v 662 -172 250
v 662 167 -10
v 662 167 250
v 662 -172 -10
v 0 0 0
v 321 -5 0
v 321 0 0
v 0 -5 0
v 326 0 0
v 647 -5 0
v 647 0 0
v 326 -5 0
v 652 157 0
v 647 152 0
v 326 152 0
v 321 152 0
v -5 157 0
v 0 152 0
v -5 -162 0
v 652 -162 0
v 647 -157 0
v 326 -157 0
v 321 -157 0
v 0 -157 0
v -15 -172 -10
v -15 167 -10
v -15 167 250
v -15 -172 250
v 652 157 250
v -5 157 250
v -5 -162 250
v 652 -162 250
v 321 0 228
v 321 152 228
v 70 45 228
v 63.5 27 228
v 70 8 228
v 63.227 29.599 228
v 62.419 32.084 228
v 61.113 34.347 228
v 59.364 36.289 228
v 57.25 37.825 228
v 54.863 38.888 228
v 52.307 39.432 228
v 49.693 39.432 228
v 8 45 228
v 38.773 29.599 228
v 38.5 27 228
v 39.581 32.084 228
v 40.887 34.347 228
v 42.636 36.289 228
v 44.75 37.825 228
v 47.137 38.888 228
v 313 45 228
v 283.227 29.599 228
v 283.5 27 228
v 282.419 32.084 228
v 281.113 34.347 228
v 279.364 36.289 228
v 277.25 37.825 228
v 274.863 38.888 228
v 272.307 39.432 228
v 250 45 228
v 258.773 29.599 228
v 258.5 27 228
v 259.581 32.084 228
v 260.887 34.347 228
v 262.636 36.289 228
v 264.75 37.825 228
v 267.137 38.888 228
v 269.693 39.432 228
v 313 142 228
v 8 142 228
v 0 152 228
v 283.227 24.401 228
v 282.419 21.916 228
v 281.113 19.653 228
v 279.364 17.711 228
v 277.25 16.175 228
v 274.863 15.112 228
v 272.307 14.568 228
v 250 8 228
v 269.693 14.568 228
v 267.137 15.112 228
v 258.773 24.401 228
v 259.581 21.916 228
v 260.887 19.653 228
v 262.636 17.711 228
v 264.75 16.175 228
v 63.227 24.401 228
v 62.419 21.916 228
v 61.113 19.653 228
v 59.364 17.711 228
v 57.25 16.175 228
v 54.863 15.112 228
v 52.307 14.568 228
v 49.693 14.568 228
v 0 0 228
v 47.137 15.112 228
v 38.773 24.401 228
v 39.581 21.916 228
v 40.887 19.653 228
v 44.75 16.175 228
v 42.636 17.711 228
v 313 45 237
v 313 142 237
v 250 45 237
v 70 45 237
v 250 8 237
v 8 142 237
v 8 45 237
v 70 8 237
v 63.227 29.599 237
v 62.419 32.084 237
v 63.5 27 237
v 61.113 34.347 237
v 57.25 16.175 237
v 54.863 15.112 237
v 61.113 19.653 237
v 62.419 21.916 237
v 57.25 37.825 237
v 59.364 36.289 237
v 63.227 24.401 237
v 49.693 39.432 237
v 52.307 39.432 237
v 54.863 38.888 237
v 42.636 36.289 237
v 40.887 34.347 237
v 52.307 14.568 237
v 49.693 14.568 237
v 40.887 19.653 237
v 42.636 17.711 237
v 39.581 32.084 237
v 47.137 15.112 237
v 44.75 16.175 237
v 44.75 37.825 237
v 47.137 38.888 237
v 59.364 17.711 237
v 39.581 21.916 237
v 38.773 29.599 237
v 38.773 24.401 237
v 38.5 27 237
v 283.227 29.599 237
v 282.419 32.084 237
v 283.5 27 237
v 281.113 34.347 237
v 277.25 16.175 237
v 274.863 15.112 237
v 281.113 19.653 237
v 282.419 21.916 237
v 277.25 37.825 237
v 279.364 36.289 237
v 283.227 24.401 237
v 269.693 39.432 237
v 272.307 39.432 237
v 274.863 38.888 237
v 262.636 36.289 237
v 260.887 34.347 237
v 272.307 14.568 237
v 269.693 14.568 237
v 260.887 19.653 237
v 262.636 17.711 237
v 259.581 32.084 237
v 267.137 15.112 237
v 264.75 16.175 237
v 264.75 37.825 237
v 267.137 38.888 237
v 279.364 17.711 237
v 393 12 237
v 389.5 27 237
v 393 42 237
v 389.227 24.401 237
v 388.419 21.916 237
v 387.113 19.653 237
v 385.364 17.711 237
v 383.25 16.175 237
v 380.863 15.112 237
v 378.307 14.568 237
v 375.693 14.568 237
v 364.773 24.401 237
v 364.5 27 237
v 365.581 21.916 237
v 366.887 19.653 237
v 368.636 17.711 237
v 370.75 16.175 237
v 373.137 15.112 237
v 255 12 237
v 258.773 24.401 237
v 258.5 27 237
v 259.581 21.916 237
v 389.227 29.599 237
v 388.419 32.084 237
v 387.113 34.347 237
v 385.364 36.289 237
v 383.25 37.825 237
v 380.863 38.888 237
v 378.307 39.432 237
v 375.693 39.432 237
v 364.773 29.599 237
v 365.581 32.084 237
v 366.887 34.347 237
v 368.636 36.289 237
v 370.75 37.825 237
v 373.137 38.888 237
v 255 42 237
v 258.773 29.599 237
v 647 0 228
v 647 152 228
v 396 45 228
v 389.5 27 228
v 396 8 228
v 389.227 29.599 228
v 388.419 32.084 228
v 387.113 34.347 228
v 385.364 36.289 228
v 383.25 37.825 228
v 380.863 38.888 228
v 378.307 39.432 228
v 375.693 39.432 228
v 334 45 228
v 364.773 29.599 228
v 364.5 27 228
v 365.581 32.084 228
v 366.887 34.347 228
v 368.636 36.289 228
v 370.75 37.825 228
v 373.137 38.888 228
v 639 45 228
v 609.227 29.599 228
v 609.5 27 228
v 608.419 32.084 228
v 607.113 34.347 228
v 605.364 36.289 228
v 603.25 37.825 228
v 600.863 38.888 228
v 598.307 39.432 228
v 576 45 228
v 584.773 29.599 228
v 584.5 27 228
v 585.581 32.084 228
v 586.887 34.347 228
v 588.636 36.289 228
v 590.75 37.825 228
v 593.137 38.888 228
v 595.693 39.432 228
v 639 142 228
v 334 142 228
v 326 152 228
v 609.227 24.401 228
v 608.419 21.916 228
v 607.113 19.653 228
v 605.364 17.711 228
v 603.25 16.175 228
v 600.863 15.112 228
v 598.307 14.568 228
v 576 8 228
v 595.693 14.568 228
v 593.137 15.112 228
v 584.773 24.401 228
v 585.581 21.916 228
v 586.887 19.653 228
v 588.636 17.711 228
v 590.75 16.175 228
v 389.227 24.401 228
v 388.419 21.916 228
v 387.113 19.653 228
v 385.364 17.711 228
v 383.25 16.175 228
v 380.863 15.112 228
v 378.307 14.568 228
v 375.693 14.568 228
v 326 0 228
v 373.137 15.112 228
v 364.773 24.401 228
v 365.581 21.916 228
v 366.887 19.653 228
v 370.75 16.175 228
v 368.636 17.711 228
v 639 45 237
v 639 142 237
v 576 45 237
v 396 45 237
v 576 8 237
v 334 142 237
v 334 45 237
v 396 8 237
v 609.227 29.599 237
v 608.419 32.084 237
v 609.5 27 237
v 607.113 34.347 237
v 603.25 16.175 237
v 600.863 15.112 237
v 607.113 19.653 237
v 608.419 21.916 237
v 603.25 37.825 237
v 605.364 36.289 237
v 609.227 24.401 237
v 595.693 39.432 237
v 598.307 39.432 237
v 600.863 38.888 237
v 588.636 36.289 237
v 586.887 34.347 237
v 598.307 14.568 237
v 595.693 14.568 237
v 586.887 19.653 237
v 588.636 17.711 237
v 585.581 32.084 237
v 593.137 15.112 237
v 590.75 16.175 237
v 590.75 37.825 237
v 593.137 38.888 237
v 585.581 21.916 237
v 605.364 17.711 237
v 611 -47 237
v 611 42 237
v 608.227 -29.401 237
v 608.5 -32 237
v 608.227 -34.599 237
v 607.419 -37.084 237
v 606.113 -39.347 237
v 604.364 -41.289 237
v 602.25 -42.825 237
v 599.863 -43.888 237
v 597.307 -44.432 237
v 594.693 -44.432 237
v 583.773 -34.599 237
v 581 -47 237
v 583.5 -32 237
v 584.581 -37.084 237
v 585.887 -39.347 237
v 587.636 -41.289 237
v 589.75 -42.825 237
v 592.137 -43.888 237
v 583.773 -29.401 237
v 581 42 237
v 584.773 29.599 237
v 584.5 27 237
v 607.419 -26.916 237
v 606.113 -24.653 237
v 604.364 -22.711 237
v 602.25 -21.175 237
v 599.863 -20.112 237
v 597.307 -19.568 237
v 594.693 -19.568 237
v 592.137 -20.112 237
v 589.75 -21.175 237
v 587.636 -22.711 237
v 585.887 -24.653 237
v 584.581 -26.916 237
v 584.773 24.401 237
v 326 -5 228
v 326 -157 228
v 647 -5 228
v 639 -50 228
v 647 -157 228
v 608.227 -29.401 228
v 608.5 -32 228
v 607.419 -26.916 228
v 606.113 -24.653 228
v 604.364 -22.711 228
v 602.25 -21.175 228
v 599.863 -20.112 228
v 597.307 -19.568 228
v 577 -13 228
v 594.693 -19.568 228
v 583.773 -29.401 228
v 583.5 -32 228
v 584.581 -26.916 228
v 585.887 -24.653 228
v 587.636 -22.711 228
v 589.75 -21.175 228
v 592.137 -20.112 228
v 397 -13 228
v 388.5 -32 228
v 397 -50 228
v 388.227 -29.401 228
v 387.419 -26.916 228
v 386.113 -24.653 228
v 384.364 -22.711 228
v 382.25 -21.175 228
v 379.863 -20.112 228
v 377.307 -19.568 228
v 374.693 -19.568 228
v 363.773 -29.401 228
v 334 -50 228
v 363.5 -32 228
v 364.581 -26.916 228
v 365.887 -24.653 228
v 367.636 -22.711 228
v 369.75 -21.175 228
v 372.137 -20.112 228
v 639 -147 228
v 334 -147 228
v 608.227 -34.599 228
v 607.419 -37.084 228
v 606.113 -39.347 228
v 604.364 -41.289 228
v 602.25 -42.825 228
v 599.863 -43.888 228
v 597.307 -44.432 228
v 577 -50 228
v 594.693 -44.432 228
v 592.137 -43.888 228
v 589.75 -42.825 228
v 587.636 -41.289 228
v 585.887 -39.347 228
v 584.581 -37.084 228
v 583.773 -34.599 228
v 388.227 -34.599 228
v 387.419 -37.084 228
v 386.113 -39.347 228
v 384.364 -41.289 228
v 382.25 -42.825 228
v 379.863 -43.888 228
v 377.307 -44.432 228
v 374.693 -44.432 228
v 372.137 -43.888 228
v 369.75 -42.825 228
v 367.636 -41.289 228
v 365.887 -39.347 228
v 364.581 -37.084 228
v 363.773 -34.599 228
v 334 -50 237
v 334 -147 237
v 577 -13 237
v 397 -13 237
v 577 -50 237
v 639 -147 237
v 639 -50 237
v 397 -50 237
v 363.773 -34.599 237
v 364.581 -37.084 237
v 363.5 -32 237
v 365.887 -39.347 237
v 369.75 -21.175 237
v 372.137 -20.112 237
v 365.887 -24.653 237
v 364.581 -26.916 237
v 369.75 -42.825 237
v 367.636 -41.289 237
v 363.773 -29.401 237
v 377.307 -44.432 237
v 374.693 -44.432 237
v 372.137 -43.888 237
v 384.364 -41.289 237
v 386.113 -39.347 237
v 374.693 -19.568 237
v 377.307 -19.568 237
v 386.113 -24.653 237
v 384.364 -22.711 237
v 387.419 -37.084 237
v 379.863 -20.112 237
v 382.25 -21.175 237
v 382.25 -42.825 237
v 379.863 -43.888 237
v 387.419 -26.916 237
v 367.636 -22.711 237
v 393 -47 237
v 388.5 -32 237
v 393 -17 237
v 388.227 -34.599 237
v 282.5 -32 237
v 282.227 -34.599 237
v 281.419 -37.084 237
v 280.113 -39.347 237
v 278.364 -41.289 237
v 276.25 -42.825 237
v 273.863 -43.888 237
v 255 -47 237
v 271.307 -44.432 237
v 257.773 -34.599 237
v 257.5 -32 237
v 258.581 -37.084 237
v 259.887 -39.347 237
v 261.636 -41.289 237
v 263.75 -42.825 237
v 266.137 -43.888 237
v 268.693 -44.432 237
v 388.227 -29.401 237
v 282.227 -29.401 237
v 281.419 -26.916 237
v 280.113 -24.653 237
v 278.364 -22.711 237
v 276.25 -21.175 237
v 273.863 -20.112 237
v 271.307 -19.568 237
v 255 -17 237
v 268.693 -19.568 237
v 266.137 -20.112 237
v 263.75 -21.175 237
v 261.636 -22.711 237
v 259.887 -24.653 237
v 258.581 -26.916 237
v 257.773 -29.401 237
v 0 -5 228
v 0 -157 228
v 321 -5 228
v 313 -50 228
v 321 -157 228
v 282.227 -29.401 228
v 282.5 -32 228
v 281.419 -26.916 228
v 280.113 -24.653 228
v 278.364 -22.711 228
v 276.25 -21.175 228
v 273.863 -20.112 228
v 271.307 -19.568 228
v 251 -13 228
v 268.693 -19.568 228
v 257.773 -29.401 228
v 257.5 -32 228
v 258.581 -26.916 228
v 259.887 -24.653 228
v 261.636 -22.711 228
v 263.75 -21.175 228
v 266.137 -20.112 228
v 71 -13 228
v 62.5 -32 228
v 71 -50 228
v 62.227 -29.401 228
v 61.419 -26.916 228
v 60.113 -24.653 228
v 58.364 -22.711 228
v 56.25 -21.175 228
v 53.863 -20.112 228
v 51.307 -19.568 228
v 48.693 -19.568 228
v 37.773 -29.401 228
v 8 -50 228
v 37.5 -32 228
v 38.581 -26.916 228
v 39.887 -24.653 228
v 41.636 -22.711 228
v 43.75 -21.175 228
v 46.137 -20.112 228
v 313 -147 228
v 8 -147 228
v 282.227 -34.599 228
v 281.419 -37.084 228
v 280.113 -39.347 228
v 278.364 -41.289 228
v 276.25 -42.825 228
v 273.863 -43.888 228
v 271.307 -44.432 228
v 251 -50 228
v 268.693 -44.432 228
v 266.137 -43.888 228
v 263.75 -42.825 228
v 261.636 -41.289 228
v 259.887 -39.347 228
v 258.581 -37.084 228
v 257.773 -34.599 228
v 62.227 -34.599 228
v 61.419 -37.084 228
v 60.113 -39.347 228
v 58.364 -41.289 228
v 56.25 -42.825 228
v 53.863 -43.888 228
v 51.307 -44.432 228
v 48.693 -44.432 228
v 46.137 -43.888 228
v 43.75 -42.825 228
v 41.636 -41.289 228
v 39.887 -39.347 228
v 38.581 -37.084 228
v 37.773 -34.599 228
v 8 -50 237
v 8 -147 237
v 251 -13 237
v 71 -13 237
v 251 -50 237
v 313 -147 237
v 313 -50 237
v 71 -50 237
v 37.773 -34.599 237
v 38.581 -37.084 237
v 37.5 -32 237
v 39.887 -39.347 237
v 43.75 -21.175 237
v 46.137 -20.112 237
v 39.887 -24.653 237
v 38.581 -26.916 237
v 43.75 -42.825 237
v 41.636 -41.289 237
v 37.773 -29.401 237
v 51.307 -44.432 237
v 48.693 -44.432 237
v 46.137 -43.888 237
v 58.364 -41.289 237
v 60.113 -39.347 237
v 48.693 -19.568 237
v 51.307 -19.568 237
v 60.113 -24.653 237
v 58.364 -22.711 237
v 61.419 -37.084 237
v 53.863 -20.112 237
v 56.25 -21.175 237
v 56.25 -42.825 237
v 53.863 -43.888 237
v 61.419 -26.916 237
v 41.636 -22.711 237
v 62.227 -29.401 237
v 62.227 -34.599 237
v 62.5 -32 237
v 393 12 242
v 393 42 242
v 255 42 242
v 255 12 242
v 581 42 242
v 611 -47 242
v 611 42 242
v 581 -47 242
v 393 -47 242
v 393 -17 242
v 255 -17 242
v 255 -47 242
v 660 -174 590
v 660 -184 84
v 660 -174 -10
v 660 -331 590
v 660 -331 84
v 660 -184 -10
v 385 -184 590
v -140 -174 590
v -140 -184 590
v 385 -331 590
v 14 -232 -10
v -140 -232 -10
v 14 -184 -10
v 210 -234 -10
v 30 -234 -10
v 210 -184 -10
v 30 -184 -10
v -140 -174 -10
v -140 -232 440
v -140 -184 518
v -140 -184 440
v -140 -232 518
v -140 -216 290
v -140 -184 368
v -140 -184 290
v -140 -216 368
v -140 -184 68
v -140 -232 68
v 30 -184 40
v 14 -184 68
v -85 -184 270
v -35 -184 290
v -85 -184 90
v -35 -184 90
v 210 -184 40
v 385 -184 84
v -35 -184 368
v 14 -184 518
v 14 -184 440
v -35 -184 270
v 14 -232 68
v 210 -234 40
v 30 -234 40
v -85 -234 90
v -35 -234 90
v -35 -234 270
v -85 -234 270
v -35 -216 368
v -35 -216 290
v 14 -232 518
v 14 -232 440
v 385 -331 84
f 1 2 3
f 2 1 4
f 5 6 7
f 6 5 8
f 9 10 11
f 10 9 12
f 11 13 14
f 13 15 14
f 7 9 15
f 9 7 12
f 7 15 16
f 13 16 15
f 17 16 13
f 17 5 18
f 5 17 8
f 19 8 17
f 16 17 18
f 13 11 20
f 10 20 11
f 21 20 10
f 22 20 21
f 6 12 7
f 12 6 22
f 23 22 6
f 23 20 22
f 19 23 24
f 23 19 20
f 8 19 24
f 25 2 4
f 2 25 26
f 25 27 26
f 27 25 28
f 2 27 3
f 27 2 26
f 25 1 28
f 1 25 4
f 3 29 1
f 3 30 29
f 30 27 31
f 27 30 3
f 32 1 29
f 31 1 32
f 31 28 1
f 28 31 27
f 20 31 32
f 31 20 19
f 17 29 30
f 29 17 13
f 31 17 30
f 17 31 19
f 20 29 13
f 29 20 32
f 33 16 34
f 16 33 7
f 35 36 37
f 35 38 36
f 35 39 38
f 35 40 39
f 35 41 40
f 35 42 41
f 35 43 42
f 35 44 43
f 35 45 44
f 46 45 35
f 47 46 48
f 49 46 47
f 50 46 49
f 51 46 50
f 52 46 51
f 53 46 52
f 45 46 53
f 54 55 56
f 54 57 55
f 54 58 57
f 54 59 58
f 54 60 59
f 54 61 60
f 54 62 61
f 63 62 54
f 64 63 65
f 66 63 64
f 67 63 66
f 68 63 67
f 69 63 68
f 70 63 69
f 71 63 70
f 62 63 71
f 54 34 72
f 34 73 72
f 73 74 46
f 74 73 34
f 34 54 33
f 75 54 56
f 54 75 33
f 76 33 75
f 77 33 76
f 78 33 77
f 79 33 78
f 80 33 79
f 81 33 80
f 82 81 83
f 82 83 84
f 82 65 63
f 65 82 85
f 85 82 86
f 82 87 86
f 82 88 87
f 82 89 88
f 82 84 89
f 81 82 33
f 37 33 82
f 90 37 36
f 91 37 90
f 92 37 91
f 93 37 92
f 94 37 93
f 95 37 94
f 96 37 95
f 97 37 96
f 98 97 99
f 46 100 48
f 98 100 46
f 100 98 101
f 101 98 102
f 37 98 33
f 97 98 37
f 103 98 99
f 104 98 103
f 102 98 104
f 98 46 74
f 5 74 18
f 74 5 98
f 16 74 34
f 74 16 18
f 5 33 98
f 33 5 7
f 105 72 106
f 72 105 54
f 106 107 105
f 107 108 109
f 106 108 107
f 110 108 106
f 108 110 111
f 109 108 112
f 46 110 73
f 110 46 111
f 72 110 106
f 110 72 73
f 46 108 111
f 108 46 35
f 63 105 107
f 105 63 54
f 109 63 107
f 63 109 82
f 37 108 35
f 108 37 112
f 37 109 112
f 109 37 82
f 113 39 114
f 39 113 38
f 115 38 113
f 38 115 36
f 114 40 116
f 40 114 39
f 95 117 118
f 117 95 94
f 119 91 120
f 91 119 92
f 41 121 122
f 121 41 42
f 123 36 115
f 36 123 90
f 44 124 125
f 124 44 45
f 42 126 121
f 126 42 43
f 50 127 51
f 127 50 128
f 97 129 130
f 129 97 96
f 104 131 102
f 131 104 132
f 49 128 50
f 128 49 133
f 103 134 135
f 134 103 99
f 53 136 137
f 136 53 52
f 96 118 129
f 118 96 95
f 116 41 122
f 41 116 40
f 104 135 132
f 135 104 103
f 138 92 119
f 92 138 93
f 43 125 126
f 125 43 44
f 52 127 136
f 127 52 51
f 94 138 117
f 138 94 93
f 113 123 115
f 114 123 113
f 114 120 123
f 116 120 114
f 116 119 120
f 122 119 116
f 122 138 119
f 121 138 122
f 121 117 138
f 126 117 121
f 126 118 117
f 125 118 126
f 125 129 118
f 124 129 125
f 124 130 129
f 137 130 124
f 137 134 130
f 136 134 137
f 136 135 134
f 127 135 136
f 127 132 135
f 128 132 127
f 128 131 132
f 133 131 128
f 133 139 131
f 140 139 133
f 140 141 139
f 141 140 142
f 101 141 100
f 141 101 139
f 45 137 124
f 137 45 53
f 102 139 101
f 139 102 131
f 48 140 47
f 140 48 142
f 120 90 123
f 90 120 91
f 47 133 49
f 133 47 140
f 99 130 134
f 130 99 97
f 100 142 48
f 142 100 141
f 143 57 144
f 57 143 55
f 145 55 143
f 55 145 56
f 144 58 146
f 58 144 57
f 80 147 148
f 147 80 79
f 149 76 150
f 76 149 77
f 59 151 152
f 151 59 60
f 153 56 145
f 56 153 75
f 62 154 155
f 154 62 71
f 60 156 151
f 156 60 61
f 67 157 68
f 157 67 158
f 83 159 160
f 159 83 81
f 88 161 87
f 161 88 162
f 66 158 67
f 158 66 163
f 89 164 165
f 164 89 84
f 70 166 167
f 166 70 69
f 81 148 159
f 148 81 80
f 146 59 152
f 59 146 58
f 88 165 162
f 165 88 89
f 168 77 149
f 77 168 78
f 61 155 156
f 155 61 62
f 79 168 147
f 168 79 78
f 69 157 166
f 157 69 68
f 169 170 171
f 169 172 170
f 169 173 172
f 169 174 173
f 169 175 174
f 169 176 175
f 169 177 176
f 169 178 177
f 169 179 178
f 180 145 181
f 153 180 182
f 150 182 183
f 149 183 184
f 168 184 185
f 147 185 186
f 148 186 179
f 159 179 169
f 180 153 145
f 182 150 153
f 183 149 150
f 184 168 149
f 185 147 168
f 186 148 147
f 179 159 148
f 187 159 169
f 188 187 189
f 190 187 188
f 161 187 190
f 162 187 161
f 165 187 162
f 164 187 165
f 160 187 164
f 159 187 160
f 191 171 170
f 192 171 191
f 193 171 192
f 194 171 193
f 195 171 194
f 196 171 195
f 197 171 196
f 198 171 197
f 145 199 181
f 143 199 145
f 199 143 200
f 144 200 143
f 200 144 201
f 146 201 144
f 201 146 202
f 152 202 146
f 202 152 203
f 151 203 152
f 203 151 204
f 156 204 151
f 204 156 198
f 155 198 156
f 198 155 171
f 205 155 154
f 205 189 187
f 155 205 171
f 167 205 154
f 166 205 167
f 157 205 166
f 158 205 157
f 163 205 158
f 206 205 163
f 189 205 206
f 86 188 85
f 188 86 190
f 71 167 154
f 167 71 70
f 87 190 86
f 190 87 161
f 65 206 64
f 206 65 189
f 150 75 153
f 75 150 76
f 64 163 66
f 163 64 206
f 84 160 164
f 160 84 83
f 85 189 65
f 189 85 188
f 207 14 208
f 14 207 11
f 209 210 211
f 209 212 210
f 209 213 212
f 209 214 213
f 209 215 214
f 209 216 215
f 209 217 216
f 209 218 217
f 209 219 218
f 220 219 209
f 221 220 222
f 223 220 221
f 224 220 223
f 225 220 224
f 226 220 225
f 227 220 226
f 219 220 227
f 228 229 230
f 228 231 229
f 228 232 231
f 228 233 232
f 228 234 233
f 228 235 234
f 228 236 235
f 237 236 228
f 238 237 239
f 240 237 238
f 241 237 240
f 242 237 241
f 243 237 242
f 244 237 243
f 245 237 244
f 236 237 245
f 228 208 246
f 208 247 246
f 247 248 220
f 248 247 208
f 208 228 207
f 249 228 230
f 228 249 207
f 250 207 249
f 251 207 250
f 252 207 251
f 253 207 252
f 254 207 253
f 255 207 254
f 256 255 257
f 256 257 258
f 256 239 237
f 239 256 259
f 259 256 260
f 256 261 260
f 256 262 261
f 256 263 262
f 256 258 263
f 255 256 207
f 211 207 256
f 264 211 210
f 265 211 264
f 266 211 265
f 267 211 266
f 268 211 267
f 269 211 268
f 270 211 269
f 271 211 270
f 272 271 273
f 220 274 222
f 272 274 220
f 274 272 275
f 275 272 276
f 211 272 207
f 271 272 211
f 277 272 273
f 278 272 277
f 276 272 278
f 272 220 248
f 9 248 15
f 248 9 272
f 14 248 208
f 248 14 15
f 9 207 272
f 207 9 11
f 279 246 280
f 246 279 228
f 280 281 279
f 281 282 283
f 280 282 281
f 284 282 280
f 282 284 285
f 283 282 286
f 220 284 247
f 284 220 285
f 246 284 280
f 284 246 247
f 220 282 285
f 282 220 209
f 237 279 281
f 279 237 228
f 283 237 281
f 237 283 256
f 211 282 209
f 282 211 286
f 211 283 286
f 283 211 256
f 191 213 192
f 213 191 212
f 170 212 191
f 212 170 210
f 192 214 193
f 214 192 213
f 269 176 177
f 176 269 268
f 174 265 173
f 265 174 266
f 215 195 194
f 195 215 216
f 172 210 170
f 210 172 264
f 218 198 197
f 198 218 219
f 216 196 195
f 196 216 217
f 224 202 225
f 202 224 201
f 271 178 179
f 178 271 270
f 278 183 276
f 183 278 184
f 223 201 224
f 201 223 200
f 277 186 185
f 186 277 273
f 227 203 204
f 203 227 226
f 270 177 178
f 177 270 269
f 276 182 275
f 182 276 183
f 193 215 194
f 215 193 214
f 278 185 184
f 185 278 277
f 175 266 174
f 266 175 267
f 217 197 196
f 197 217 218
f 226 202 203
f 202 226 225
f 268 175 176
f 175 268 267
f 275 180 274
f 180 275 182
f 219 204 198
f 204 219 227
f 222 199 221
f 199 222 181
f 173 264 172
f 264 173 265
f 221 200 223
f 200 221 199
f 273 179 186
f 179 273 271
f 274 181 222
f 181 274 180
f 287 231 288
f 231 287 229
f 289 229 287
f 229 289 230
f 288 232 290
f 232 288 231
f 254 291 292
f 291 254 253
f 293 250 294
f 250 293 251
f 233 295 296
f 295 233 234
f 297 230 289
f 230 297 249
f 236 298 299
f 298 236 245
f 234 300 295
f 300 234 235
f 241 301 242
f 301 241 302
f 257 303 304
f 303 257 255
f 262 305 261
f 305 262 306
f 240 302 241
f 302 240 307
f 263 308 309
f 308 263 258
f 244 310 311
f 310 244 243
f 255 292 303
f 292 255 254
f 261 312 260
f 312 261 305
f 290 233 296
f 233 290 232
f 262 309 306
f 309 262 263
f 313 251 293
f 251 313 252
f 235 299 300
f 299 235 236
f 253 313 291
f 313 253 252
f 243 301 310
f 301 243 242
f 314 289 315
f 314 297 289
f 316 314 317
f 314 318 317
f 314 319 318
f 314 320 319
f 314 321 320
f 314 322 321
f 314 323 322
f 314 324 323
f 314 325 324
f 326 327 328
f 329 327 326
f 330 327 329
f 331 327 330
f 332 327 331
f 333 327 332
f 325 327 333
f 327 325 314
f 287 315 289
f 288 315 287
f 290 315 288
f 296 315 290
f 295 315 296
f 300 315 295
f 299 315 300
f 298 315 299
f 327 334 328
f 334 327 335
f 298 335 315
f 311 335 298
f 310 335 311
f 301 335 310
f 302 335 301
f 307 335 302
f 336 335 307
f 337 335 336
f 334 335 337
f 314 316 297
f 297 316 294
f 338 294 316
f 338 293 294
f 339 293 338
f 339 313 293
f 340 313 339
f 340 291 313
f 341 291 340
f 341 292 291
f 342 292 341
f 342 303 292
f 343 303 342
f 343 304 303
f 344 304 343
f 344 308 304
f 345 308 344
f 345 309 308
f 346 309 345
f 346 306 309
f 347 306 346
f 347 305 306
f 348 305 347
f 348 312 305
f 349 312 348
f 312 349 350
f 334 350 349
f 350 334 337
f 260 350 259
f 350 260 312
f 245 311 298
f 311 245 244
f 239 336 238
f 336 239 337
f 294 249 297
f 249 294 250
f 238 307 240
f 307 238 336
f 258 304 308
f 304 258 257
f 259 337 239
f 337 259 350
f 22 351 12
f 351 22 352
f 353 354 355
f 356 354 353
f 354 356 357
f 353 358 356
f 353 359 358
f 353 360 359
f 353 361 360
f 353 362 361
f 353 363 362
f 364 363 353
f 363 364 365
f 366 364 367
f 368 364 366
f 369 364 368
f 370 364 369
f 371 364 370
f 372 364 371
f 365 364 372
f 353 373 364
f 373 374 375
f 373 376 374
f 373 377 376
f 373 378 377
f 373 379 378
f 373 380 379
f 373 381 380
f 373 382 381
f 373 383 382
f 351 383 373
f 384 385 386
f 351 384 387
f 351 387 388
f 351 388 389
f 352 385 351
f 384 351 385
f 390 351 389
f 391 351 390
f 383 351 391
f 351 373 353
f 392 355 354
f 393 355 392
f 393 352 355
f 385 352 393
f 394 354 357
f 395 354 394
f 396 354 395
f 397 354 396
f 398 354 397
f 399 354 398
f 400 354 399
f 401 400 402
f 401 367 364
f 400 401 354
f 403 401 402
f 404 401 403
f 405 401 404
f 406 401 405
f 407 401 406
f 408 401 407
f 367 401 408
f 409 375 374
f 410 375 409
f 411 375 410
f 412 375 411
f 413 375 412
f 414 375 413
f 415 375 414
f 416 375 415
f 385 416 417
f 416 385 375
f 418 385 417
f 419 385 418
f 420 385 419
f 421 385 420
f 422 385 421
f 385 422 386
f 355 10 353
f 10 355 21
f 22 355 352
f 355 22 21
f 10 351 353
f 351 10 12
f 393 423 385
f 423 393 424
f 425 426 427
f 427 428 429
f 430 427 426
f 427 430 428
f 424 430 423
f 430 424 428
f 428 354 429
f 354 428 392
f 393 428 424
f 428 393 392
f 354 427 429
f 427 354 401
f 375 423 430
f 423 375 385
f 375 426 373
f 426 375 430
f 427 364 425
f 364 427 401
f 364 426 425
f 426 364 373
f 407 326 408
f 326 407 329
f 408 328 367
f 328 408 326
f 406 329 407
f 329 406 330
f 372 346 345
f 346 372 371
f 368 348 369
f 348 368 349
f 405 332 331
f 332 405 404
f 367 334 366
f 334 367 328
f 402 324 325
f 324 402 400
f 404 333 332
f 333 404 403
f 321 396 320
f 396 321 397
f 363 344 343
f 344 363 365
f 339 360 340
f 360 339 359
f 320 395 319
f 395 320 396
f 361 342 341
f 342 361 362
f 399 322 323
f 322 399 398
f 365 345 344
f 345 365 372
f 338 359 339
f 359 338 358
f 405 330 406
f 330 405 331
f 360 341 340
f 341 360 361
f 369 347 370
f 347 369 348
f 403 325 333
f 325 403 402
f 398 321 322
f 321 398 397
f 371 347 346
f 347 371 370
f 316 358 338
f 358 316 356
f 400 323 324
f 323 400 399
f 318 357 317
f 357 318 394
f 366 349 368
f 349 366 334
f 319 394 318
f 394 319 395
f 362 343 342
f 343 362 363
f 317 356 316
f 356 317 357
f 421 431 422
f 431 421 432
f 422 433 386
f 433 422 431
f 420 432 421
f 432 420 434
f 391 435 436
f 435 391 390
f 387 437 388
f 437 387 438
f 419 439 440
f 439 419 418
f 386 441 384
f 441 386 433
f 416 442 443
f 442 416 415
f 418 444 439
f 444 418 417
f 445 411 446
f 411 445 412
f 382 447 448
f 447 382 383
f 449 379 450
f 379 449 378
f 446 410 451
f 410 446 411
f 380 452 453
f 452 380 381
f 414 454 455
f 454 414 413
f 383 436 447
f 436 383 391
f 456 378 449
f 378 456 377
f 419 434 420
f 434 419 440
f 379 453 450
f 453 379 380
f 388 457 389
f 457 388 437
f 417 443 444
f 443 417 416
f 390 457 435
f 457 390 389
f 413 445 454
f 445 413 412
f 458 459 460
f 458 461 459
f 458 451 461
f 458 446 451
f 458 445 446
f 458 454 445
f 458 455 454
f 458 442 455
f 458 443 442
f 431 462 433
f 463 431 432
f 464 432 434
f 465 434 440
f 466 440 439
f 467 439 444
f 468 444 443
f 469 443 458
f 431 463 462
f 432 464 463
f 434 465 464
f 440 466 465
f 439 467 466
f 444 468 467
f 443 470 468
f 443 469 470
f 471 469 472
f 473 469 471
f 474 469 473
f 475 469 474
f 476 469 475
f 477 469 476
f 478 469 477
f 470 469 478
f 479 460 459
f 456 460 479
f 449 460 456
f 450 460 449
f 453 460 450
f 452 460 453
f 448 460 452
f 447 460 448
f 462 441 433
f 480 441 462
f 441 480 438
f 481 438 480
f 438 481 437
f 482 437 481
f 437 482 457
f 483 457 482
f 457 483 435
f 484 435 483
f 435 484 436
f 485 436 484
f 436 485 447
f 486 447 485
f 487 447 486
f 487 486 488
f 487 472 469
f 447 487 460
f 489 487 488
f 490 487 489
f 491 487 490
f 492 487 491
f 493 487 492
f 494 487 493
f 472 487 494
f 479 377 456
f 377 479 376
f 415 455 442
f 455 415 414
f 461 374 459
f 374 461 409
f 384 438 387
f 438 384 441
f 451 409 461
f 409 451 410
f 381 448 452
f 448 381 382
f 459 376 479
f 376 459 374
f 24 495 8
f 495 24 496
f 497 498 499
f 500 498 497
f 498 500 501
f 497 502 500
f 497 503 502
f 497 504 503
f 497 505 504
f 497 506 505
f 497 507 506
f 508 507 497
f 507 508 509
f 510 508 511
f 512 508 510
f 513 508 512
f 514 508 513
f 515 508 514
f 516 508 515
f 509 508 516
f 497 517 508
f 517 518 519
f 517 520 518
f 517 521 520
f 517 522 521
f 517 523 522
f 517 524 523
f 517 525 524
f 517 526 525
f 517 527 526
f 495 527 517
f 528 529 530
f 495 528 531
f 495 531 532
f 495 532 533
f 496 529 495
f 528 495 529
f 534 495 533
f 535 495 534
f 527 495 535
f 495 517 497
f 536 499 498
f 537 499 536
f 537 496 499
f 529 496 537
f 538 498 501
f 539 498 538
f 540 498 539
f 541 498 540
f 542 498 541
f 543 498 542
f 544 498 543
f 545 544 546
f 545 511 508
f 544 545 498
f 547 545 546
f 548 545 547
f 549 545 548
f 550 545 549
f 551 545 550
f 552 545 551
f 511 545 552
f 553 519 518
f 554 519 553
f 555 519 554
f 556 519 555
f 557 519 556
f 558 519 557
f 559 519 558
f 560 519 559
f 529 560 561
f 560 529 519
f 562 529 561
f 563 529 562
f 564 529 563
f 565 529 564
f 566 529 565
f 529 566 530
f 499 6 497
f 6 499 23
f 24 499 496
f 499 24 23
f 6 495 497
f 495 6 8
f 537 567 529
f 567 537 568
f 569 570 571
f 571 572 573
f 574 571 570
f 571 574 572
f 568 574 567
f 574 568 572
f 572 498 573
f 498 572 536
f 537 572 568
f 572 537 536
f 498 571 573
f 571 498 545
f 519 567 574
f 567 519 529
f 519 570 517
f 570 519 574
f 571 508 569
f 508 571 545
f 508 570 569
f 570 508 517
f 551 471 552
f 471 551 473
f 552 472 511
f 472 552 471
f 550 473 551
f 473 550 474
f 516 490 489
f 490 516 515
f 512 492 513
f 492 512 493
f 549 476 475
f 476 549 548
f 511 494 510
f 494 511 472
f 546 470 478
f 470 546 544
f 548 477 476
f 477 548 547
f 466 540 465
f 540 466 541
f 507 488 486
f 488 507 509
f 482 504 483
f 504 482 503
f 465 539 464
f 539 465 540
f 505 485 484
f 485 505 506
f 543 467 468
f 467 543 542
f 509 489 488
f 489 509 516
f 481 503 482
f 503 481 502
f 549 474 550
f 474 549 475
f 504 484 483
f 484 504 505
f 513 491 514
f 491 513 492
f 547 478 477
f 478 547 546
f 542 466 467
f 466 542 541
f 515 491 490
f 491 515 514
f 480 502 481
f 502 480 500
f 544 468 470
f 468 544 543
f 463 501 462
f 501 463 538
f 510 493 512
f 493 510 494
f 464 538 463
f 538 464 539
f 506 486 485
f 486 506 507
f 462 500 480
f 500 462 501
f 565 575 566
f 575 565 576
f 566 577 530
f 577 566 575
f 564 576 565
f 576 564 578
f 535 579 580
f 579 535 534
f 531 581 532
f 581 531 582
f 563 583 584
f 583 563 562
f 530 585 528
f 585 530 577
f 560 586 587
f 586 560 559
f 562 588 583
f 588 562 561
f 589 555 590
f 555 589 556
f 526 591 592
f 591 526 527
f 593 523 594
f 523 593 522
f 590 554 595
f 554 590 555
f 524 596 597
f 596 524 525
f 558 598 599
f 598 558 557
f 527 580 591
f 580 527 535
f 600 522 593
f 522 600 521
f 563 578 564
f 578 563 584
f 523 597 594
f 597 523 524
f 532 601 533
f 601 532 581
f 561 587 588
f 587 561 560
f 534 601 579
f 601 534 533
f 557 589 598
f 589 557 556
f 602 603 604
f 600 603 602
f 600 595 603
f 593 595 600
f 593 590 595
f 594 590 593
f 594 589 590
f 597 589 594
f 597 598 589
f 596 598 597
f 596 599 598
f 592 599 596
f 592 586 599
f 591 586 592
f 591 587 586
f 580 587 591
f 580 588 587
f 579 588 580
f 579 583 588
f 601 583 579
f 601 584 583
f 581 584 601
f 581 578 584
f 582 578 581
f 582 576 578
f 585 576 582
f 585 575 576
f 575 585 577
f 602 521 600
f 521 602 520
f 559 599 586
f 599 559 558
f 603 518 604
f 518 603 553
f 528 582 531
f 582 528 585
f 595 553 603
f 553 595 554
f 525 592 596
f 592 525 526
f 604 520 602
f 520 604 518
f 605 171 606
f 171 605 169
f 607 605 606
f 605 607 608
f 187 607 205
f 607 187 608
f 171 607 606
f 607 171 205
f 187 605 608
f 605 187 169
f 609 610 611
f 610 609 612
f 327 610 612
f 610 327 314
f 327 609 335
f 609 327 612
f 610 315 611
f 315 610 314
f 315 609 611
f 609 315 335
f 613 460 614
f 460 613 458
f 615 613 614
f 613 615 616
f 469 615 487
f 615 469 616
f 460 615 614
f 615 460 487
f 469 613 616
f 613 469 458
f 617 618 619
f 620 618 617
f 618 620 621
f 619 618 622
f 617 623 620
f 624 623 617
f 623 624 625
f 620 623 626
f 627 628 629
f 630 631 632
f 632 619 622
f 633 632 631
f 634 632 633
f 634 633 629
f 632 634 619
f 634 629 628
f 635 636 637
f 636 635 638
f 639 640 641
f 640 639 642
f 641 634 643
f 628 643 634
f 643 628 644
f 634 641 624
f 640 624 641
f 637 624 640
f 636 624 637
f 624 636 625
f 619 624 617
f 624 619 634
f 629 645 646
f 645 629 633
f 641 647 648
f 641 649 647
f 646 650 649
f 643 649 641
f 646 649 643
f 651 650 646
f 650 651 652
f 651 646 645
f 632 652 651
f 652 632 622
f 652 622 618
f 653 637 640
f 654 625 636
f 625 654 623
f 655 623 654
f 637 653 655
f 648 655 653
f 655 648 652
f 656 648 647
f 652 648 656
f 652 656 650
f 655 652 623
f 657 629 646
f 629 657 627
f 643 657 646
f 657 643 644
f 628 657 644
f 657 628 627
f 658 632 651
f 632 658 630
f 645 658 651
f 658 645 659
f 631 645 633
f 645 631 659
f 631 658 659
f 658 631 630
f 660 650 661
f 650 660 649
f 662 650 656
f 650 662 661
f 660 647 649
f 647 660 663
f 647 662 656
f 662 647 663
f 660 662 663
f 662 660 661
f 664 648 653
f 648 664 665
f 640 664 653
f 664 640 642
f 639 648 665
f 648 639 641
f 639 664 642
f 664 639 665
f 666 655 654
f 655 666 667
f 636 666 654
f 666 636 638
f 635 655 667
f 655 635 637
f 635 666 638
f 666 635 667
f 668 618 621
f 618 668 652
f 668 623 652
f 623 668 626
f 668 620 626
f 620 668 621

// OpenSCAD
module victron_smart_battery_200Ah()
{
    color("lightblue")
        cube([321,152,228]);
    translate([8,45,228])
        color("lightblue")
            cube([305,97,9]);
    translate([70,8,228])
        color("lightblue")
            cube([180,37,9]);
    translate([51,27,228])
        color("red")
            cylinder(9, d=25);
    translate([271,27,228])
        color("black")
            cylinder(9, d=25);
}

module victron_multiplus2_48_3000()
{
    color("lightblue")
        cube([275,147,506]);
}

module victron_smart_batteryprotect_48_100()
{
    color("lightblue")
        cube([123,120,62]);
}

module victron_smart_shunt_500A()
{
    color("lightblue")
       cube([154,48,78]);   
}

module victron_cerbo_gx()
{
    color("lightblue")
       cube([154,48,78]);   
}

module victron_vebus_bms()
{
    color("black")
        cube([105,32,78]);
}

module bluesea_powerbar_600A()
{
    color("silver")
        cube([180,50,50]);
}

module connector_short()
{
    color("silver")
        cube([89,30,5]);
}
module connector_long()
{
    color("silver")
        cube([138,30,5]);
}

module string_48VDC()
{
    victron_smart_battery_200Ah();
    translate([326,0,0])
        victron_smart_battery_200Ah();
    translate([647,-5,0])
        rotate(a=180)
            victron_smart_battery_200Ah();
    translate([321,-5,0])
        rotate(a=180)
            victron_smart_battery_200Ah();
}

module bank_48VDC()
{
    string_48VDC();
    translate([255,12,237])
        connector_long();
    translate([611,-47,237])
        rotate(a=90)
            connector_short();
    translate([255,-47,237])
        connector_long();
        
}

module box_bottom_lid()
{
    color("beige")
        cube([677,339,10]);
}

module box_longside()
{
    color("beige")
        cube([677,10,250]);
}

module box_shortside()
{
    color("beige")
        cube([10,319,250]);
}

module box()
{    
    translate([-15,-172,-10])
        box_bottom_lid();
    translate([-15,-172,0])
        box_longside();
    translate([-15,157,0])
        box_longside();
    translate([-15,-162,0])
        box_shortside();
    translate([652,-162,0])
        box_shortside();
    translate([-15,-172,250])
        *box_bottom_lid();
}

module battery_box()
{
    box();
    bank_48VDC();
}


module electric_panel()
{
    color("beige")
        cube([800,10,600]);
    translate([0,-48,0])
        victron_smart_shunt_500A();
    translate([170,-50,0])
        bluesea_powerbar_600A();
    translate([55,-50,280])
        rotate([0,90,0])
            bluesea_powerbar_600A();
    translate([0,-32,300])
        victron_vebus_bms();
    translate([0,-48,450])
        victron_cerbo_gx();    
    translate([525,-147,94])
        victron_multiplus2_48_3000();
}

battery_box();
translate([-140,-184,-10])
    electric_panel();
